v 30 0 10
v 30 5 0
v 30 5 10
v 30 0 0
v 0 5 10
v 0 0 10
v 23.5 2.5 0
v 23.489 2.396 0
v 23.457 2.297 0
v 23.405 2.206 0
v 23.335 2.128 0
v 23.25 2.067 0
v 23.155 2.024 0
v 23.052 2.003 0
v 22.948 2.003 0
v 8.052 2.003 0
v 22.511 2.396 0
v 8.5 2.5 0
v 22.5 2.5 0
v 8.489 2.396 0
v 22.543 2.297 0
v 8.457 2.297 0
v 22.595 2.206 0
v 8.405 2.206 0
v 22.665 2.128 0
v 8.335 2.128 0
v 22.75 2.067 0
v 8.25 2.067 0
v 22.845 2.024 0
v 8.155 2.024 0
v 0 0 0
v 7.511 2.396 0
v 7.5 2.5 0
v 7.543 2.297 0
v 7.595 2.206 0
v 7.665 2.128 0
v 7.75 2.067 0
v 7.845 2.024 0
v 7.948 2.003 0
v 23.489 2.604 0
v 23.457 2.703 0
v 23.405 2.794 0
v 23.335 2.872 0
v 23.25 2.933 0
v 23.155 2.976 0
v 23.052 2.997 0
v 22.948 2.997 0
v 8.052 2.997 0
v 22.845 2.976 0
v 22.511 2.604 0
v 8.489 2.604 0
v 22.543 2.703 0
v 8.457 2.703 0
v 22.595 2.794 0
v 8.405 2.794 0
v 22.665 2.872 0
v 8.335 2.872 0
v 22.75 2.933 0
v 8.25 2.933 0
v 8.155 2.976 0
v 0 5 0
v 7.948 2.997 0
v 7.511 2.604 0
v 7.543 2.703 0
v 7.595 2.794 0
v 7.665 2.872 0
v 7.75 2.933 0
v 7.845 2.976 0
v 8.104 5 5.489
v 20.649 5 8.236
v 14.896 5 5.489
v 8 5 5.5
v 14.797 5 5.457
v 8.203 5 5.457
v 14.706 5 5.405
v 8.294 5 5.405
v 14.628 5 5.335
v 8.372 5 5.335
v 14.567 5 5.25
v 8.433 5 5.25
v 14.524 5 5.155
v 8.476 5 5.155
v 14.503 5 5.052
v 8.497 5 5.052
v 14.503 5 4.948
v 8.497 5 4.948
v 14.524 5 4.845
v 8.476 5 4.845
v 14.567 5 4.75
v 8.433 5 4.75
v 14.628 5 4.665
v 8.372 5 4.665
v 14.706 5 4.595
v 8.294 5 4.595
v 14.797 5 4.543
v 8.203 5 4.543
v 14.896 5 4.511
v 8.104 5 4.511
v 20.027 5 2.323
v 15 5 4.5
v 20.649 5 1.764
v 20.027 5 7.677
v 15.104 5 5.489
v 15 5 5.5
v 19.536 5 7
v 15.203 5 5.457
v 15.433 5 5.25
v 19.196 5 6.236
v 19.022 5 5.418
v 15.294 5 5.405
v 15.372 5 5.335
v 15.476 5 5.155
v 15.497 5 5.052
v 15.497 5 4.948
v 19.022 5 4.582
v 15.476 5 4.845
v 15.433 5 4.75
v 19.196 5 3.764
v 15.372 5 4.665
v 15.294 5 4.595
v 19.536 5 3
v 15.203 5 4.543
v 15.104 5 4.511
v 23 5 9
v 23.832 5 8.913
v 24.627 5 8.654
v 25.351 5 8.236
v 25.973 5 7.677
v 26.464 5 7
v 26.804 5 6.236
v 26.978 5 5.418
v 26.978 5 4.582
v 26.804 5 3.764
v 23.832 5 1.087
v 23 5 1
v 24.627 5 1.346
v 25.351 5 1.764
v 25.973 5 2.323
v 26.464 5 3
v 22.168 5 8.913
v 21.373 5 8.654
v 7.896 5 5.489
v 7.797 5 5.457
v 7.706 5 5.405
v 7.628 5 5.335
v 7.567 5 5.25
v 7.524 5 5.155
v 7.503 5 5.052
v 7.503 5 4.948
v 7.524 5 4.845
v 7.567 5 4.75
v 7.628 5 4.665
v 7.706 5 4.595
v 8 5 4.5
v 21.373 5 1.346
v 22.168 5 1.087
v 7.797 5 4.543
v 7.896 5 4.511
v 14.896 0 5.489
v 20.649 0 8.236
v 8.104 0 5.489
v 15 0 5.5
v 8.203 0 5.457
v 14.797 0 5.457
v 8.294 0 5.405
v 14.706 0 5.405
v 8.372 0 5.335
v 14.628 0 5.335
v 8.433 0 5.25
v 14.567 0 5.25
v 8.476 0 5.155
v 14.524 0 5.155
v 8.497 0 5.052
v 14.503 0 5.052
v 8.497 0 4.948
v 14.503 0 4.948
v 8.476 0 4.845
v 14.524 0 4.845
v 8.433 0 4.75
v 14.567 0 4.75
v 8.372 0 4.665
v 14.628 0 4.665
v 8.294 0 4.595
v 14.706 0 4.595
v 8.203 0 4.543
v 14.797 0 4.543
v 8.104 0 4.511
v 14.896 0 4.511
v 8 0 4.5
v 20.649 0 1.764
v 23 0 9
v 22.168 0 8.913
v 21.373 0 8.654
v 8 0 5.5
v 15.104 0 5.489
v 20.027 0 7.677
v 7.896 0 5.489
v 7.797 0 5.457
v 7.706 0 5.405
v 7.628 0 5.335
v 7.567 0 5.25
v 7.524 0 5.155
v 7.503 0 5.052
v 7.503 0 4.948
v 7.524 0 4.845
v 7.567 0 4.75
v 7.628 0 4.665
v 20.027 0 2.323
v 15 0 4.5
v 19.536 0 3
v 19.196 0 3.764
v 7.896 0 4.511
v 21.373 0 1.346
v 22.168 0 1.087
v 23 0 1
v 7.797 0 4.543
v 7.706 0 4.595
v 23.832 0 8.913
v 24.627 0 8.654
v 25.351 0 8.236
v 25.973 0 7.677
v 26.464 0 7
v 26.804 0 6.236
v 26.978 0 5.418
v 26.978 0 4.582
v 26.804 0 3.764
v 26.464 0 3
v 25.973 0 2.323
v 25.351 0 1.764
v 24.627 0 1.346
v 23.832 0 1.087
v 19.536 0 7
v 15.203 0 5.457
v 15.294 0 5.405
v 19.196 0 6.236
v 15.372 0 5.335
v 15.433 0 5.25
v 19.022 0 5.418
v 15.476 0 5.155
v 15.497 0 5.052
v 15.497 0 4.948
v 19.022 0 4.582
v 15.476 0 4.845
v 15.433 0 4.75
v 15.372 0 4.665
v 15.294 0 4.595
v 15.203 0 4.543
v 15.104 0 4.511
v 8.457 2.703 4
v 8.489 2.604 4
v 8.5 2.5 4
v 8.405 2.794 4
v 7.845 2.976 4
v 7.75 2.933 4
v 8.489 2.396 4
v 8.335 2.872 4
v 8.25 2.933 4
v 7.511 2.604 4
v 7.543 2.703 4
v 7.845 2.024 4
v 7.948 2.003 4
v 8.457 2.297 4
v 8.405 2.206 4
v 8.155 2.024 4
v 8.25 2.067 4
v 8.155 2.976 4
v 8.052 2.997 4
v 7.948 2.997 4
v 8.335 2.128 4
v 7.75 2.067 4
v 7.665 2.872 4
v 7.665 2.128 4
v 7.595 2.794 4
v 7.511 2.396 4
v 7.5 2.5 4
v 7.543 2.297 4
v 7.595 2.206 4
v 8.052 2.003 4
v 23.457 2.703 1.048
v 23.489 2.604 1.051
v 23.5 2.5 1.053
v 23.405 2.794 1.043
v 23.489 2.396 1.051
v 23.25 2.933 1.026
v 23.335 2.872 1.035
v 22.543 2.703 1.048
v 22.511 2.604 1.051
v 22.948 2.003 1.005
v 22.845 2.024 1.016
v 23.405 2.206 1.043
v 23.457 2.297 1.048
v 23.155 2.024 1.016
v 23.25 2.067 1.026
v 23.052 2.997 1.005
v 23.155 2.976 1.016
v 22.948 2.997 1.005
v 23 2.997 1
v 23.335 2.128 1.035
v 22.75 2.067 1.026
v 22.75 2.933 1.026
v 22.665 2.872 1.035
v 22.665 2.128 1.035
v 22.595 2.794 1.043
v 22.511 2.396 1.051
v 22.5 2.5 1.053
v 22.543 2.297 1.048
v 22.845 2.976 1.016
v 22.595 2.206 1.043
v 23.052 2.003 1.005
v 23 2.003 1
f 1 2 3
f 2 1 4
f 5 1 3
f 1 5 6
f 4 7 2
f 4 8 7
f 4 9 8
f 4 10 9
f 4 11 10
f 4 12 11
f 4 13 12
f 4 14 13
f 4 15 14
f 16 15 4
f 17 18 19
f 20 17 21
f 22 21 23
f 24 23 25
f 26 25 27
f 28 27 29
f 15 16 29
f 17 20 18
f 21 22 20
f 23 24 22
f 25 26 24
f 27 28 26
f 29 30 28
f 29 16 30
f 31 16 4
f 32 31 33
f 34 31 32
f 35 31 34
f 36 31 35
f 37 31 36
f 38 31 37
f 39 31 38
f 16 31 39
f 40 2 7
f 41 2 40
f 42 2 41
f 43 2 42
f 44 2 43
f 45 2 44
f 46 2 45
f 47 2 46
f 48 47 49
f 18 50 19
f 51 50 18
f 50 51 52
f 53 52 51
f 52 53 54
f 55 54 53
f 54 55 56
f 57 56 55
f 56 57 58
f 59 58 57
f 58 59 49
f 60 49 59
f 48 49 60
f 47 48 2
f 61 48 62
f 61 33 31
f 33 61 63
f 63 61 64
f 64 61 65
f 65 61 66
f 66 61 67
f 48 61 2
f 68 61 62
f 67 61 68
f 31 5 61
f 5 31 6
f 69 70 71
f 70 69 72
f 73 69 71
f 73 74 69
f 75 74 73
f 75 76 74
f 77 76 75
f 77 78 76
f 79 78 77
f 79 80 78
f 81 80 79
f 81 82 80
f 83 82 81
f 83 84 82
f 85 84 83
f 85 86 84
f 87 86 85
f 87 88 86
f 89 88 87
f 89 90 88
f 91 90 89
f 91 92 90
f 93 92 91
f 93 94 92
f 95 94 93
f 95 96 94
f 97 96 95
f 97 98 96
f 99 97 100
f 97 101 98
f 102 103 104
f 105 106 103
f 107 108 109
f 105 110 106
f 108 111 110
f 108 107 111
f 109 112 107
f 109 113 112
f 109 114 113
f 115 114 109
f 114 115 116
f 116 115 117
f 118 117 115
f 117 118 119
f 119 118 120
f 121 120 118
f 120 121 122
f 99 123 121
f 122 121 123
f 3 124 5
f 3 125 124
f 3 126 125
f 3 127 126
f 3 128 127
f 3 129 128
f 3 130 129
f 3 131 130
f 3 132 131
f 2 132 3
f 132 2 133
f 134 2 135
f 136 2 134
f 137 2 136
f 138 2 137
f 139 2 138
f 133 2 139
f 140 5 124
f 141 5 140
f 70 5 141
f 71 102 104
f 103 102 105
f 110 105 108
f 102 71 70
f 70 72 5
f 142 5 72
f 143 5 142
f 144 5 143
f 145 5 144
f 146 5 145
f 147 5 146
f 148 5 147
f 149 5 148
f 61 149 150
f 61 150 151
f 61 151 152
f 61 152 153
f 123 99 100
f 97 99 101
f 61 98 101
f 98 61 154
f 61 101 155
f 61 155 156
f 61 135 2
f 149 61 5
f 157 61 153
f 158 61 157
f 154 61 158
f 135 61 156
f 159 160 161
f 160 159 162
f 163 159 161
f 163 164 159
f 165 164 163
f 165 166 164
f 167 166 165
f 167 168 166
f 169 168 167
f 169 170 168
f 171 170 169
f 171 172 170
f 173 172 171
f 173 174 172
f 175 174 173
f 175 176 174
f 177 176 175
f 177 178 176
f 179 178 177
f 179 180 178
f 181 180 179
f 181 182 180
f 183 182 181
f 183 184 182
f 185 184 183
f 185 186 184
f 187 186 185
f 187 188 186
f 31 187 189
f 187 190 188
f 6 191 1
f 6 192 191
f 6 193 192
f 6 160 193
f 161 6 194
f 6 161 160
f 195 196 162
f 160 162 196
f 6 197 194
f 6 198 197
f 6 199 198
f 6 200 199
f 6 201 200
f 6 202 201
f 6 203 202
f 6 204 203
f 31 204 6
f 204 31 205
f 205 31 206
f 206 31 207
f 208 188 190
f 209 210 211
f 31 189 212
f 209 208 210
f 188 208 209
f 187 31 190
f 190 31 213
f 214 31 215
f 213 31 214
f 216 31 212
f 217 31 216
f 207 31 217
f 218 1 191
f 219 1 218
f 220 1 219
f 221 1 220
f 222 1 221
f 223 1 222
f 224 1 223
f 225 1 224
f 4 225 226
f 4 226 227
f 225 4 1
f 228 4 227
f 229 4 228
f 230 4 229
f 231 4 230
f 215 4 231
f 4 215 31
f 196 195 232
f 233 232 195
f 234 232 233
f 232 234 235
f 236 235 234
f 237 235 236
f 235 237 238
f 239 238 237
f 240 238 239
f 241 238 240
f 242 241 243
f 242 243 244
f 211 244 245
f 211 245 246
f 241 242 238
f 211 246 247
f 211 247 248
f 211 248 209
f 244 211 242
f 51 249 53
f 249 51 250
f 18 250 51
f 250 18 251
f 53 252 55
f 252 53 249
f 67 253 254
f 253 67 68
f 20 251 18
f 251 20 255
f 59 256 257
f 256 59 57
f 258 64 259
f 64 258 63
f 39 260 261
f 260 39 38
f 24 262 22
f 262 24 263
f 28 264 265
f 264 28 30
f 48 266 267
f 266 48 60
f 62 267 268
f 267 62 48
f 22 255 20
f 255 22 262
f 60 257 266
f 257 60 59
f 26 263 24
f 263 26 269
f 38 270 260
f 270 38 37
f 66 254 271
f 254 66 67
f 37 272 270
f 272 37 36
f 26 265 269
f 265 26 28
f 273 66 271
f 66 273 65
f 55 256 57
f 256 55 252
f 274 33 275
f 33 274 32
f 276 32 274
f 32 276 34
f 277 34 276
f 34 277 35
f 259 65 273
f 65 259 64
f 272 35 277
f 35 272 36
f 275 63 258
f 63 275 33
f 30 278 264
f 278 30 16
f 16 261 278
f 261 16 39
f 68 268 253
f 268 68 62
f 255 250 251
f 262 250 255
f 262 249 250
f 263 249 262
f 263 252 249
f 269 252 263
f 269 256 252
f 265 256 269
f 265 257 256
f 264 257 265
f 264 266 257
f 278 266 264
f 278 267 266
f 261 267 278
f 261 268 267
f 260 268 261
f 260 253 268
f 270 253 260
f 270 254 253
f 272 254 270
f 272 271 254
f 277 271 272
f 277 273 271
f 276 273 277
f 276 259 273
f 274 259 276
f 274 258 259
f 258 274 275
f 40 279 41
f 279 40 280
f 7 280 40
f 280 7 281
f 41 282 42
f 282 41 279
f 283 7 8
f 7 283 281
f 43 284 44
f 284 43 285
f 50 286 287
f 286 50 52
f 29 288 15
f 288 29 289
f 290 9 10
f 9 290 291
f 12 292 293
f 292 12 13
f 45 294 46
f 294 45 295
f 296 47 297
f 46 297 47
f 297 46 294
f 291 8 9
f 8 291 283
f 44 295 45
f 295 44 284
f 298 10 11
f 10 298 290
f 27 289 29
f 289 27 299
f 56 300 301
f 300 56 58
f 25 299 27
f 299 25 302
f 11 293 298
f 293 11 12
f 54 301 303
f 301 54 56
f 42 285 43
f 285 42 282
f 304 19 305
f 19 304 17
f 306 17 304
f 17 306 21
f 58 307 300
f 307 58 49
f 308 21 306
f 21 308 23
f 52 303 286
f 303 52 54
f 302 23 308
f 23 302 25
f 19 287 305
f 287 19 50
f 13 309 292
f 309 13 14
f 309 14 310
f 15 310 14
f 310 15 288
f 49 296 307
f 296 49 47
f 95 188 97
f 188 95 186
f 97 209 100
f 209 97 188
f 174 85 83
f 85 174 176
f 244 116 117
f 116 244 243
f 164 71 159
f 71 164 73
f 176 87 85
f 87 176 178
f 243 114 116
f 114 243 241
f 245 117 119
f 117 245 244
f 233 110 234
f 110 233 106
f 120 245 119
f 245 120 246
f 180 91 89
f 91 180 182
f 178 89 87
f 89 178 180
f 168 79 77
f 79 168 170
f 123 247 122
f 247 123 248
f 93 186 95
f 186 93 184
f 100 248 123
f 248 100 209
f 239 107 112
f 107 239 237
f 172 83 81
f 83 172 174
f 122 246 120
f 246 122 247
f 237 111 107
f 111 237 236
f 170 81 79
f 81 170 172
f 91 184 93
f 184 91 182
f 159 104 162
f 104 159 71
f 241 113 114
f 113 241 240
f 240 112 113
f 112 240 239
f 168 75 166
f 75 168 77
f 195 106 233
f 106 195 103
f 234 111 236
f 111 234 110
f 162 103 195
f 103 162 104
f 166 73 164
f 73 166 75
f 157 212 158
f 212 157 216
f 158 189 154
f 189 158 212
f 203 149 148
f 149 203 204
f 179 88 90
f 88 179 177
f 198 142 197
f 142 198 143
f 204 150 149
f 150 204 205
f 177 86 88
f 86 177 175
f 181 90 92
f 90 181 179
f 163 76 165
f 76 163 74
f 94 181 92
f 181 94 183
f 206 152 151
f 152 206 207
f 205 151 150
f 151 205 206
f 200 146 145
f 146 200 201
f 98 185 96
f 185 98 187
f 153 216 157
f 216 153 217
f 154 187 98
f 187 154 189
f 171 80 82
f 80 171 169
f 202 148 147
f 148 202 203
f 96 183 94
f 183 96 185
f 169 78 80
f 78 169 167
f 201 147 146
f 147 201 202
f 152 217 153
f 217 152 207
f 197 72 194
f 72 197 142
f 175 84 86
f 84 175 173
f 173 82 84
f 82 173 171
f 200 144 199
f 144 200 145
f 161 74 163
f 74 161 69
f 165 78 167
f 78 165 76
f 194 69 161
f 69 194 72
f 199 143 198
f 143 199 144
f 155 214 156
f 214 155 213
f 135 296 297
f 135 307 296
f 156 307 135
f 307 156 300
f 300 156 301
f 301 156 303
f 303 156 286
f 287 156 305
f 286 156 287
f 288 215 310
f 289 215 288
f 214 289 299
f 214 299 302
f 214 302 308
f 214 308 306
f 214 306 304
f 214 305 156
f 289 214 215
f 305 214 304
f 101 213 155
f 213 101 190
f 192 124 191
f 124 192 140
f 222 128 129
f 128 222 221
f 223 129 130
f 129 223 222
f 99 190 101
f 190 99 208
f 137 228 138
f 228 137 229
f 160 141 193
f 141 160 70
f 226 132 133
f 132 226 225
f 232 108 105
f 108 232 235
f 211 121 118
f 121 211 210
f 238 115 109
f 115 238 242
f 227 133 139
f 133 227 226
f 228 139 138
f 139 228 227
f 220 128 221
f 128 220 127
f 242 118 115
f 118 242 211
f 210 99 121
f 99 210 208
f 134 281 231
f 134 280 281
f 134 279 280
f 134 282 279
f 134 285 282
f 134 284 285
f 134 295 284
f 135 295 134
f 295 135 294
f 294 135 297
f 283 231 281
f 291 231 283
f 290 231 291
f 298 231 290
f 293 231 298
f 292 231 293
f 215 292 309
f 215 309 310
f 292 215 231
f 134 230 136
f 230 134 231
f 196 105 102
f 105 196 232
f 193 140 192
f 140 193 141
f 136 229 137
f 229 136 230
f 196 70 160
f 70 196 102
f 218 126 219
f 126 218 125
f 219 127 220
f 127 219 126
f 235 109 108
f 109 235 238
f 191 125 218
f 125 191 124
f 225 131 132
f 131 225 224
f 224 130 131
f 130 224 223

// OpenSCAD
module motormount(){
    
}
/*

translate([-5,-2.5,2])
cube([30,5,10]);


module M2screw(length){
    //AHN2-4,6,8
    color("silver") cylinder(h=length,r=1); //M2
    color("silver") cylinder(h=0.3,r=1.7);//頭
}


M2screw(8);//AHN2-8
translate([20,0,0])
    M2screw(8);
*/
$fs=0.01;
render(convexity = 2) 
difference(){
    cube([30,5,10]);
    translate([8,2.5,-1])
    cylinder(h=5, r=0.5);
        translate([15+8,2.5,-1])
    cylinder(h=5, r=0.5);
    
    //タイヤ用のピンの穴
    translate([15,-1,5])
    rotate([0,90,90])
    cylinder(h=12, r=0.5);
    

    translate([8,-1,5])
    rotate([0,90,90])
    cylinder(h=12, r=0.5);
    
    //モーター穴
    translate([15+8,-1,5])
    rotate([0,90,90])
    cylinder(h=12, r=4);    
}
